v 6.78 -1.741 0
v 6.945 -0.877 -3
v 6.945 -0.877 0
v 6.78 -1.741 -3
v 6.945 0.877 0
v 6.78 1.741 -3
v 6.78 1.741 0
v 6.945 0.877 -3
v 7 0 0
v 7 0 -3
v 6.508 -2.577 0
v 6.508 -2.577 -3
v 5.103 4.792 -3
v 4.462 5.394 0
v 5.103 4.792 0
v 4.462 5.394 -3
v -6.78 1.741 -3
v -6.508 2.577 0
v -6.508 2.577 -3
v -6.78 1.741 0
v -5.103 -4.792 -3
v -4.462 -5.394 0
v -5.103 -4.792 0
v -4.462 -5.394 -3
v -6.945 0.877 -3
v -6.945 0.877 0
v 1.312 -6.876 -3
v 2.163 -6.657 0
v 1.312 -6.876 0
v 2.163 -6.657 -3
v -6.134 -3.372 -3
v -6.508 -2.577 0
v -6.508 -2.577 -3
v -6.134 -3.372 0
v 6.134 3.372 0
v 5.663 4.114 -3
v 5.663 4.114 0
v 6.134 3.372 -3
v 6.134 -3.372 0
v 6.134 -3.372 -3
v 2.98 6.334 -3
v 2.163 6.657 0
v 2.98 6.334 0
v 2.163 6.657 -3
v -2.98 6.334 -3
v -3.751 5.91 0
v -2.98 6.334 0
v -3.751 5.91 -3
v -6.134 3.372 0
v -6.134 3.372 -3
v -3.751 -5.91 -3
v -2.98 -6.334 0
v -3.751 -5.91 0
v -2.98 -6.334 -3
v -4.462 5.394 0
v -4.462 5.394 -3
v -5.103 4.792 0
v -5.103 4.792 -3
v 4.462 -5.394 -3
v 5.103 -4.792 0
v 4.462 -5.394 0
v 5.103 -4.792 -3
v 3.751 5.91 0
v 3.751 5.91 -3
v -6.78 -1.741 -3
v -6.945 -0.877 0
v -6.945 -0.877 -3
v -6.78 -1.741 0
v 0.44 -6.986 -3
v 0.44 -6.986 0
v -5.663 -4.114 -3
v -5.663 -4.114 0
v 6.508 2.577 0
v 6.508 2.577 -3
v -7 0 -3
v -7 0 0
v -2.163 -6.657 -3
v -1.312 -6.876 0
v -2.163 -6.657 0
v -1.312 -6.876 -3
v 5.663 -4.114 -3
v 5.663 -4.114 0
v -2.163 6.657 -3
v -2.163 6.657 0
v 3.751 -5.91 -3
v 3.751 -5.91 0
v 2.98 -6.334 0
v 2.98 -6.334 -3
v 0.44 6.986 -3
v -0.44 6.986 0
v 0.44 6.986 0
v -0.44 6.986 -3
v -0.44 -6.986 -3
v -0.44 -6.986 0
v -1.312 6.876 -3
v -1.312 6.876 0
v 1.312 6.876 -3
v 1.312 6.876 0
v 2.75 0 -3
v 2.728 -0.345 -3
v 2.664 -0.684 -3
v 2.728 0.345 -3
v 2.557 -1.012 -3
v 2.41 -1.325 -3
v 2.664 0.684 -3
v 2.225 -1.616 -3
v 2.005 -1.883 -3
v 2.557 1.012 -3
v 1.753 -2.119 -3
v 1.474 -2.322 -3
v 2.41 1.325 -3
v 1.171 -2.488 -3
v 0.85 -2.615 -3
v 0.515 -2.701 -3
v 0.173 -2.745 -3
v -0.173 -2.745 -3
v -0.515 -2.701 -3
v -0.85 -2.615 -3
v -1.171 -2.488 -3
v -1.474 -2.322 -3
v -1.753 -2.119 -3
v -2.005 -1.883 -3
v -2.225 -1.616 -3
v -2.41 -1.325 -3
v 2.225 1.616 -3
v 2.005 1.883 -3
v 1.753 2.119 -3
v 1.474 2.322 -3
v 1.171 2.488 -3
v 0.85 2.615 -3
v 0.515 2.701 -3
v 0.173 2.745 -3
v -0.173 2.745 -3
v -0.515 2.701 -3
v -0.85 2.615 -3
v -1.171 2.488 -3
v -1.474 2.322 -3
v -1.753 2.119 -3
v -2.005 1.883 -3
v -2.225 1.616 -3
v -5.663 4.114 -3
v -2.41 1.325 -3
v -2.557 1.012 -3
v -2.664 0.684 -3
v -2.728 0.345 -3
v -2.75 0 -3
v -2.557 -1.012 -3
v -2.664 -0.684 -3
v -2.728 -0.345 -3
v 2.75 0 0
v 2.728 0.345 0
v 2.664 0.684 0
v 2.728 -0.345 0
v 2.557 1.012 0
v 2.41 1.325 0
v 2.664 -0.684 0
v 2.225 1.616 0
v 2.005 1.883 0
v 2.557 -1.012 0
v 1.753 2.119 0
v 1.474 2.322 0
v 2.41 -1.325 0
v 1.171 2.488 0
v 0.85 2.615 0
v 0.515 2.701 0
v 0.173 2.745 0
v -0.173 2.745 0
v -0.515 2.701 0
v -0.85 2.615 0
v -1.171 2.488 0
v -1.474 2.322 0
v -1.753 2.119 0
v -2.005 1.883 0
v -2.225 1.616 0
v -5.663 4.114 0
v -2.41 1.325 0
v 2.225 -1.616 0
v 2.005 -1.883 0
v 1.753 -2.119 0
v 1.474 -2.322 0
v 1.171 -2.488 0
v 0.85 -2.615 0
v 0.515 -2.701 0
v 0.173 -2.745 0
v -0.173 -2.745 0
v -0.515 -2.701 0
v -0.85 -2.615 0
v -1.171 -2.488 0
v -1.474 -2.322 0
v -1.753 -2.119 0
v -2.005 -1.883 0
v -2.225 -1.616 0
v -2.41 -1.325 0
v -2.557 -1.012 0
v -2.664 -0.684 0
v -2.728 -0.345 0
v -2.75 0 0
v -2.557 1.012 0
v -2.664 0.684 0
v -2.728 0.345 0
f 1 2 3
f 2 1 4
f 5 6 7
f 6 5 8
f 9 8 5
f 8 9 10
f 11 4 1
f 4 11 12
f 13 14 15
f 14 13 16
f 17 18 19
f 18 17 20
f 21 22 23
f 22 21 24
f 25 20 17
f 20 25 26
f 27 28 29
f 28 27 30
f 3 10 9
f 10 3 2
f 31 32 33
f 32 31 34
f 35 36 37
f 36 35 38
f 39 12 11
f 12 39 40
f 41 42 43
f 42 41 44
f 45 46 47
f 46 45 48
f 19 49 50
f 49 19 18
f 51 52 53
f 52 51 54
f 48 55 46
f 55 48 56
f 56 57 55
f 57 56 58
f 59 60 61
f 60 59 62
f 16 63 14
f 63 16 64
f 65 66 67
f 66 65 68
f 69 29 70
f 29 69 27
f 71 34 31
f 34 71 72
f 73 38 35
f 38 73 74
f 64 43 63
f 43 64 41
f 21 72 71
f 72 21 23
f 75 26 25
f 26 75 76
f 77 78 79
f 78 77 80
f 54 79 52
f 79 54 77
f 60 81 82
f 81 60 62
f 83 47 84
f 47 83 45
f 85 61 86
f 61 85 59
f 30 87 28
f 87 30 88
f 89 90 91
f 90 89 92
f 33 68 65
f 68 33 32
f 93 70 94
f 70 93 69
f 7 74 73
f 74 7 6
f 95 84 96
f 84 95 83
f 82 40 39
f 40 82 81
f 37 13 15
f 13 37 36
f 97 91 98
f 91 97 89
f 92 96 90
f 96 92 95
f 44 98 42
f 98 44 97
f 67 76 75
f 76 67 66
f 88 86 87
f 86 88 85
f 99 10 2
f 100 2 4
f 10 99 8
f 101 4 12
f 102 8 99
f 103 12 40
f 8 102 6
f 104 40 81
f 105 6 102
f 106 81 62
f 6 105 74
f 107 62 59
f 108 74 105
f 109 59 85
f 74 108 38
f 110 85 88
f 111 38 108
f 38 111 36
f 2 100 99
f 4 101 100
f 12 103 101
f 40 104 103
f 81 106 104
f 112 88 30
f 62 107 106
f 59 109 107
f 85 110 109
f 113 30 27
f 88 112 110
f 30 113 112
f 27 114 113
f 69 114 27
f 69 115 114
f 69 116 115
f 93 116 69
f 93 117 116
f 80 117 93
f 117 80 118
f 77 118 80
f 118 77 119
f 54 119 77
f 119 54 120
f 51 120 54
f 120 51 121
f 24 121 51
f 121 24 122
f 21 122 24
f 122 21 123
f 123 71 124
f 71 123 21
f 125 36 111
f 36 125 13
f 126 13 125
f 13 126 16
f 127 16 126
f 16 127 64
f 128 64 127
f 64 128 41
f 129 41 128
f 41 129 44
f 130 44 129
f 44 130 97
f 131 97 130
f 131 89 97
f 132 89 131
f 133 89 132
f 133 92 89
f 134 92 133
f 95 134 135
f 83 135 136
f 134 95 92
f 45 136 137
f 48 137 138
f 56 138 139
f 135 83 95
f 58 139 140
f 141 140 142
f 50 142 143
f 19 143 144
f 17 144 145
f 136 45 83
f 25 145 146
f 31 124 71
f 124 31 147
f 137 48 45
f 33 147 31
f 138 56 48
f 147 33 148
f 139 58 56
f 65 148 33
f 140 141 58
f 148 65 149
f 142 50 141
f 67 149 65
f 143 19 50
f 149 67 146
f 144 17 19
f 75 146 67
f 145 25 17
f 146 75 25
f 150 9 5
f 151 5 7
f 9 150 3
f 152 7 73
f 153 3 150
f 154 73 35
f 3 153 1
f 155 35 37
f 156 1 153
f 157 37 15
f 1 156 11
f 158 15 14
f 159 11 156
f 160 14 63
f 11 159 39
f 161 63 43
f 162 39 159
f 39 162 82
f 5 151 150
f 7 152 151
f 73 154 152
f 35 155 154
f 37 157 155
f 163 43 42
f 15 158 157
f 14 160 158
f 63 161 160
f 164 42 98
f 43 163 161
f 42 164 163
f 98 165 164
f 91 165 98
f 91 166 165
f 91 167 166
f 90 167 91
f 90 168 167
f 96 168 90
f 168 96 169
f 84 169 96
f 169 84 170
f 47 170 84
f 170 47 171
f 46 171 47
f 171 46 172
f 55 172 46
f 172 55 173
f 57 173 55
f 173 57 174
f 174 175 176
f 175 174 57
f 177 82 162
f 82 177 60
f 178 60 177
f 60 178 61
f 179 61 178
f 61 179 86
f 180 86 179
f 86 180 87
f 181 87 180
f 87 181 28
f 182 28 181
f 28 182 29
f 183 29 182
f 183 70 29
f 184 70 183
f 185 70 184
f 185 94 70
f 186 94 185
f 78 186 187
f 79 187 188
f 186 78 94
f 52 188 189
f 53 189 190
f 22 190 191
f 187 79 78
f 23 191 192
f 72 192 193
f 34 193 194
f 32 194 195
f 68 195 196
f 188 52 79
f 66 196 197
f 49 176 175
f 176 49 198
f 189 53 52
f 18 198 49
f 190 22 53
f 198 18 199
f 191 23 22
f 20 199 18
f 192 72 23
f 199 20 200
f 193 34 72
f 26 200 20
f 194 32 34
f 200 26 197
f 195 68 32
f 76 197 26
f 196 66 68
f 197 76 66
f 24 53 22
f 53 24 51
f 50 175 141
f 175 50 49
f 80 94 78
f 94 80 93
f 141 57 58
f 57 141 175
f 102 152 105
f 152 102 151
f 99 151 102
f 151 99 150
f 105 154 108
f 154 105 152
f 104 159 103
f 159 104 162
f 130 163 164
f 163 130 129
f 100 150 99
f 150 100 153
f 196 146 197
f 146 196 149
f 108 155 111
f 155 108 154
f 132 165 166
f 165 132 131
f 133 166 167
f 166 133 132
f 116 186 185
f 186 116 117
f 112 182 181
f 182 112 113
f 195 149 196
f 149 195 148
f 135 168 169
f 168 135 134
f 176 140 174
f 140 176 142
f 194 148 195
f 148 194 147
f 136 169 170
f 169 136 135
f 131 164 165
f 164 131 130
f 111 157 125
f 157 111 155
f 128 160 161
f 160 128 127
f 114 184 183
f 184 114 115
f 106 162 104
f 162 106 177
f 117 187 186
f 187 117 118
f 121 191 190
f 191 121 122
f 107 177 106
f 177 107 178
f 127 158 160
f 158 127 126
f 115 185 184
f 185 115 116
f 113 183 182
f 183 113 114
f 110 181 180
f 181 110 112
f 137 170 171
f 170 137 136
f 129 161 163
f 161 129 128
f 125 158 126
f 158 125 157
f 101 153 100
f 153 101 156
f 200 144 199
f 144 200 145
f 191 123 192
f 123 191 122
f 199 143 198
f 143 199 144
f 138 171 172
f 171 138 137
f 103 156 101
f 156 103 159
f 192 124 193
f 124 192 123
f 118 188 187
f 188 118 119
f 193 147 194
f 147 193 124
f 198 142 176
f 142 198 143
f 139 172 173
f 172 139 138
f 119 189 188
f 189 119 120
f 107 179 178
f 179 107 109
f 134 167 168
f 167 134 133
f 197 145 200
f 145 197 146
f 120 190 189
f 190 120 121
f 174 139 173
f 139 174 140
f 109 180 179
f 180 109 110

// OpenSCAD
$fn = 50;


difference() {
	union() {
		translate(v = [0, 0, -3.0000000000]) {
			cylinder(h = 3, r = 7.0000000000);
		}
		cylinder(h = 0, r = 10.0000000000);
	}
	union() {
		#translate(v = [0, 0, -3]) {
			cylinder(h = 3, r = 2.7500000000);
		}
	}
}
